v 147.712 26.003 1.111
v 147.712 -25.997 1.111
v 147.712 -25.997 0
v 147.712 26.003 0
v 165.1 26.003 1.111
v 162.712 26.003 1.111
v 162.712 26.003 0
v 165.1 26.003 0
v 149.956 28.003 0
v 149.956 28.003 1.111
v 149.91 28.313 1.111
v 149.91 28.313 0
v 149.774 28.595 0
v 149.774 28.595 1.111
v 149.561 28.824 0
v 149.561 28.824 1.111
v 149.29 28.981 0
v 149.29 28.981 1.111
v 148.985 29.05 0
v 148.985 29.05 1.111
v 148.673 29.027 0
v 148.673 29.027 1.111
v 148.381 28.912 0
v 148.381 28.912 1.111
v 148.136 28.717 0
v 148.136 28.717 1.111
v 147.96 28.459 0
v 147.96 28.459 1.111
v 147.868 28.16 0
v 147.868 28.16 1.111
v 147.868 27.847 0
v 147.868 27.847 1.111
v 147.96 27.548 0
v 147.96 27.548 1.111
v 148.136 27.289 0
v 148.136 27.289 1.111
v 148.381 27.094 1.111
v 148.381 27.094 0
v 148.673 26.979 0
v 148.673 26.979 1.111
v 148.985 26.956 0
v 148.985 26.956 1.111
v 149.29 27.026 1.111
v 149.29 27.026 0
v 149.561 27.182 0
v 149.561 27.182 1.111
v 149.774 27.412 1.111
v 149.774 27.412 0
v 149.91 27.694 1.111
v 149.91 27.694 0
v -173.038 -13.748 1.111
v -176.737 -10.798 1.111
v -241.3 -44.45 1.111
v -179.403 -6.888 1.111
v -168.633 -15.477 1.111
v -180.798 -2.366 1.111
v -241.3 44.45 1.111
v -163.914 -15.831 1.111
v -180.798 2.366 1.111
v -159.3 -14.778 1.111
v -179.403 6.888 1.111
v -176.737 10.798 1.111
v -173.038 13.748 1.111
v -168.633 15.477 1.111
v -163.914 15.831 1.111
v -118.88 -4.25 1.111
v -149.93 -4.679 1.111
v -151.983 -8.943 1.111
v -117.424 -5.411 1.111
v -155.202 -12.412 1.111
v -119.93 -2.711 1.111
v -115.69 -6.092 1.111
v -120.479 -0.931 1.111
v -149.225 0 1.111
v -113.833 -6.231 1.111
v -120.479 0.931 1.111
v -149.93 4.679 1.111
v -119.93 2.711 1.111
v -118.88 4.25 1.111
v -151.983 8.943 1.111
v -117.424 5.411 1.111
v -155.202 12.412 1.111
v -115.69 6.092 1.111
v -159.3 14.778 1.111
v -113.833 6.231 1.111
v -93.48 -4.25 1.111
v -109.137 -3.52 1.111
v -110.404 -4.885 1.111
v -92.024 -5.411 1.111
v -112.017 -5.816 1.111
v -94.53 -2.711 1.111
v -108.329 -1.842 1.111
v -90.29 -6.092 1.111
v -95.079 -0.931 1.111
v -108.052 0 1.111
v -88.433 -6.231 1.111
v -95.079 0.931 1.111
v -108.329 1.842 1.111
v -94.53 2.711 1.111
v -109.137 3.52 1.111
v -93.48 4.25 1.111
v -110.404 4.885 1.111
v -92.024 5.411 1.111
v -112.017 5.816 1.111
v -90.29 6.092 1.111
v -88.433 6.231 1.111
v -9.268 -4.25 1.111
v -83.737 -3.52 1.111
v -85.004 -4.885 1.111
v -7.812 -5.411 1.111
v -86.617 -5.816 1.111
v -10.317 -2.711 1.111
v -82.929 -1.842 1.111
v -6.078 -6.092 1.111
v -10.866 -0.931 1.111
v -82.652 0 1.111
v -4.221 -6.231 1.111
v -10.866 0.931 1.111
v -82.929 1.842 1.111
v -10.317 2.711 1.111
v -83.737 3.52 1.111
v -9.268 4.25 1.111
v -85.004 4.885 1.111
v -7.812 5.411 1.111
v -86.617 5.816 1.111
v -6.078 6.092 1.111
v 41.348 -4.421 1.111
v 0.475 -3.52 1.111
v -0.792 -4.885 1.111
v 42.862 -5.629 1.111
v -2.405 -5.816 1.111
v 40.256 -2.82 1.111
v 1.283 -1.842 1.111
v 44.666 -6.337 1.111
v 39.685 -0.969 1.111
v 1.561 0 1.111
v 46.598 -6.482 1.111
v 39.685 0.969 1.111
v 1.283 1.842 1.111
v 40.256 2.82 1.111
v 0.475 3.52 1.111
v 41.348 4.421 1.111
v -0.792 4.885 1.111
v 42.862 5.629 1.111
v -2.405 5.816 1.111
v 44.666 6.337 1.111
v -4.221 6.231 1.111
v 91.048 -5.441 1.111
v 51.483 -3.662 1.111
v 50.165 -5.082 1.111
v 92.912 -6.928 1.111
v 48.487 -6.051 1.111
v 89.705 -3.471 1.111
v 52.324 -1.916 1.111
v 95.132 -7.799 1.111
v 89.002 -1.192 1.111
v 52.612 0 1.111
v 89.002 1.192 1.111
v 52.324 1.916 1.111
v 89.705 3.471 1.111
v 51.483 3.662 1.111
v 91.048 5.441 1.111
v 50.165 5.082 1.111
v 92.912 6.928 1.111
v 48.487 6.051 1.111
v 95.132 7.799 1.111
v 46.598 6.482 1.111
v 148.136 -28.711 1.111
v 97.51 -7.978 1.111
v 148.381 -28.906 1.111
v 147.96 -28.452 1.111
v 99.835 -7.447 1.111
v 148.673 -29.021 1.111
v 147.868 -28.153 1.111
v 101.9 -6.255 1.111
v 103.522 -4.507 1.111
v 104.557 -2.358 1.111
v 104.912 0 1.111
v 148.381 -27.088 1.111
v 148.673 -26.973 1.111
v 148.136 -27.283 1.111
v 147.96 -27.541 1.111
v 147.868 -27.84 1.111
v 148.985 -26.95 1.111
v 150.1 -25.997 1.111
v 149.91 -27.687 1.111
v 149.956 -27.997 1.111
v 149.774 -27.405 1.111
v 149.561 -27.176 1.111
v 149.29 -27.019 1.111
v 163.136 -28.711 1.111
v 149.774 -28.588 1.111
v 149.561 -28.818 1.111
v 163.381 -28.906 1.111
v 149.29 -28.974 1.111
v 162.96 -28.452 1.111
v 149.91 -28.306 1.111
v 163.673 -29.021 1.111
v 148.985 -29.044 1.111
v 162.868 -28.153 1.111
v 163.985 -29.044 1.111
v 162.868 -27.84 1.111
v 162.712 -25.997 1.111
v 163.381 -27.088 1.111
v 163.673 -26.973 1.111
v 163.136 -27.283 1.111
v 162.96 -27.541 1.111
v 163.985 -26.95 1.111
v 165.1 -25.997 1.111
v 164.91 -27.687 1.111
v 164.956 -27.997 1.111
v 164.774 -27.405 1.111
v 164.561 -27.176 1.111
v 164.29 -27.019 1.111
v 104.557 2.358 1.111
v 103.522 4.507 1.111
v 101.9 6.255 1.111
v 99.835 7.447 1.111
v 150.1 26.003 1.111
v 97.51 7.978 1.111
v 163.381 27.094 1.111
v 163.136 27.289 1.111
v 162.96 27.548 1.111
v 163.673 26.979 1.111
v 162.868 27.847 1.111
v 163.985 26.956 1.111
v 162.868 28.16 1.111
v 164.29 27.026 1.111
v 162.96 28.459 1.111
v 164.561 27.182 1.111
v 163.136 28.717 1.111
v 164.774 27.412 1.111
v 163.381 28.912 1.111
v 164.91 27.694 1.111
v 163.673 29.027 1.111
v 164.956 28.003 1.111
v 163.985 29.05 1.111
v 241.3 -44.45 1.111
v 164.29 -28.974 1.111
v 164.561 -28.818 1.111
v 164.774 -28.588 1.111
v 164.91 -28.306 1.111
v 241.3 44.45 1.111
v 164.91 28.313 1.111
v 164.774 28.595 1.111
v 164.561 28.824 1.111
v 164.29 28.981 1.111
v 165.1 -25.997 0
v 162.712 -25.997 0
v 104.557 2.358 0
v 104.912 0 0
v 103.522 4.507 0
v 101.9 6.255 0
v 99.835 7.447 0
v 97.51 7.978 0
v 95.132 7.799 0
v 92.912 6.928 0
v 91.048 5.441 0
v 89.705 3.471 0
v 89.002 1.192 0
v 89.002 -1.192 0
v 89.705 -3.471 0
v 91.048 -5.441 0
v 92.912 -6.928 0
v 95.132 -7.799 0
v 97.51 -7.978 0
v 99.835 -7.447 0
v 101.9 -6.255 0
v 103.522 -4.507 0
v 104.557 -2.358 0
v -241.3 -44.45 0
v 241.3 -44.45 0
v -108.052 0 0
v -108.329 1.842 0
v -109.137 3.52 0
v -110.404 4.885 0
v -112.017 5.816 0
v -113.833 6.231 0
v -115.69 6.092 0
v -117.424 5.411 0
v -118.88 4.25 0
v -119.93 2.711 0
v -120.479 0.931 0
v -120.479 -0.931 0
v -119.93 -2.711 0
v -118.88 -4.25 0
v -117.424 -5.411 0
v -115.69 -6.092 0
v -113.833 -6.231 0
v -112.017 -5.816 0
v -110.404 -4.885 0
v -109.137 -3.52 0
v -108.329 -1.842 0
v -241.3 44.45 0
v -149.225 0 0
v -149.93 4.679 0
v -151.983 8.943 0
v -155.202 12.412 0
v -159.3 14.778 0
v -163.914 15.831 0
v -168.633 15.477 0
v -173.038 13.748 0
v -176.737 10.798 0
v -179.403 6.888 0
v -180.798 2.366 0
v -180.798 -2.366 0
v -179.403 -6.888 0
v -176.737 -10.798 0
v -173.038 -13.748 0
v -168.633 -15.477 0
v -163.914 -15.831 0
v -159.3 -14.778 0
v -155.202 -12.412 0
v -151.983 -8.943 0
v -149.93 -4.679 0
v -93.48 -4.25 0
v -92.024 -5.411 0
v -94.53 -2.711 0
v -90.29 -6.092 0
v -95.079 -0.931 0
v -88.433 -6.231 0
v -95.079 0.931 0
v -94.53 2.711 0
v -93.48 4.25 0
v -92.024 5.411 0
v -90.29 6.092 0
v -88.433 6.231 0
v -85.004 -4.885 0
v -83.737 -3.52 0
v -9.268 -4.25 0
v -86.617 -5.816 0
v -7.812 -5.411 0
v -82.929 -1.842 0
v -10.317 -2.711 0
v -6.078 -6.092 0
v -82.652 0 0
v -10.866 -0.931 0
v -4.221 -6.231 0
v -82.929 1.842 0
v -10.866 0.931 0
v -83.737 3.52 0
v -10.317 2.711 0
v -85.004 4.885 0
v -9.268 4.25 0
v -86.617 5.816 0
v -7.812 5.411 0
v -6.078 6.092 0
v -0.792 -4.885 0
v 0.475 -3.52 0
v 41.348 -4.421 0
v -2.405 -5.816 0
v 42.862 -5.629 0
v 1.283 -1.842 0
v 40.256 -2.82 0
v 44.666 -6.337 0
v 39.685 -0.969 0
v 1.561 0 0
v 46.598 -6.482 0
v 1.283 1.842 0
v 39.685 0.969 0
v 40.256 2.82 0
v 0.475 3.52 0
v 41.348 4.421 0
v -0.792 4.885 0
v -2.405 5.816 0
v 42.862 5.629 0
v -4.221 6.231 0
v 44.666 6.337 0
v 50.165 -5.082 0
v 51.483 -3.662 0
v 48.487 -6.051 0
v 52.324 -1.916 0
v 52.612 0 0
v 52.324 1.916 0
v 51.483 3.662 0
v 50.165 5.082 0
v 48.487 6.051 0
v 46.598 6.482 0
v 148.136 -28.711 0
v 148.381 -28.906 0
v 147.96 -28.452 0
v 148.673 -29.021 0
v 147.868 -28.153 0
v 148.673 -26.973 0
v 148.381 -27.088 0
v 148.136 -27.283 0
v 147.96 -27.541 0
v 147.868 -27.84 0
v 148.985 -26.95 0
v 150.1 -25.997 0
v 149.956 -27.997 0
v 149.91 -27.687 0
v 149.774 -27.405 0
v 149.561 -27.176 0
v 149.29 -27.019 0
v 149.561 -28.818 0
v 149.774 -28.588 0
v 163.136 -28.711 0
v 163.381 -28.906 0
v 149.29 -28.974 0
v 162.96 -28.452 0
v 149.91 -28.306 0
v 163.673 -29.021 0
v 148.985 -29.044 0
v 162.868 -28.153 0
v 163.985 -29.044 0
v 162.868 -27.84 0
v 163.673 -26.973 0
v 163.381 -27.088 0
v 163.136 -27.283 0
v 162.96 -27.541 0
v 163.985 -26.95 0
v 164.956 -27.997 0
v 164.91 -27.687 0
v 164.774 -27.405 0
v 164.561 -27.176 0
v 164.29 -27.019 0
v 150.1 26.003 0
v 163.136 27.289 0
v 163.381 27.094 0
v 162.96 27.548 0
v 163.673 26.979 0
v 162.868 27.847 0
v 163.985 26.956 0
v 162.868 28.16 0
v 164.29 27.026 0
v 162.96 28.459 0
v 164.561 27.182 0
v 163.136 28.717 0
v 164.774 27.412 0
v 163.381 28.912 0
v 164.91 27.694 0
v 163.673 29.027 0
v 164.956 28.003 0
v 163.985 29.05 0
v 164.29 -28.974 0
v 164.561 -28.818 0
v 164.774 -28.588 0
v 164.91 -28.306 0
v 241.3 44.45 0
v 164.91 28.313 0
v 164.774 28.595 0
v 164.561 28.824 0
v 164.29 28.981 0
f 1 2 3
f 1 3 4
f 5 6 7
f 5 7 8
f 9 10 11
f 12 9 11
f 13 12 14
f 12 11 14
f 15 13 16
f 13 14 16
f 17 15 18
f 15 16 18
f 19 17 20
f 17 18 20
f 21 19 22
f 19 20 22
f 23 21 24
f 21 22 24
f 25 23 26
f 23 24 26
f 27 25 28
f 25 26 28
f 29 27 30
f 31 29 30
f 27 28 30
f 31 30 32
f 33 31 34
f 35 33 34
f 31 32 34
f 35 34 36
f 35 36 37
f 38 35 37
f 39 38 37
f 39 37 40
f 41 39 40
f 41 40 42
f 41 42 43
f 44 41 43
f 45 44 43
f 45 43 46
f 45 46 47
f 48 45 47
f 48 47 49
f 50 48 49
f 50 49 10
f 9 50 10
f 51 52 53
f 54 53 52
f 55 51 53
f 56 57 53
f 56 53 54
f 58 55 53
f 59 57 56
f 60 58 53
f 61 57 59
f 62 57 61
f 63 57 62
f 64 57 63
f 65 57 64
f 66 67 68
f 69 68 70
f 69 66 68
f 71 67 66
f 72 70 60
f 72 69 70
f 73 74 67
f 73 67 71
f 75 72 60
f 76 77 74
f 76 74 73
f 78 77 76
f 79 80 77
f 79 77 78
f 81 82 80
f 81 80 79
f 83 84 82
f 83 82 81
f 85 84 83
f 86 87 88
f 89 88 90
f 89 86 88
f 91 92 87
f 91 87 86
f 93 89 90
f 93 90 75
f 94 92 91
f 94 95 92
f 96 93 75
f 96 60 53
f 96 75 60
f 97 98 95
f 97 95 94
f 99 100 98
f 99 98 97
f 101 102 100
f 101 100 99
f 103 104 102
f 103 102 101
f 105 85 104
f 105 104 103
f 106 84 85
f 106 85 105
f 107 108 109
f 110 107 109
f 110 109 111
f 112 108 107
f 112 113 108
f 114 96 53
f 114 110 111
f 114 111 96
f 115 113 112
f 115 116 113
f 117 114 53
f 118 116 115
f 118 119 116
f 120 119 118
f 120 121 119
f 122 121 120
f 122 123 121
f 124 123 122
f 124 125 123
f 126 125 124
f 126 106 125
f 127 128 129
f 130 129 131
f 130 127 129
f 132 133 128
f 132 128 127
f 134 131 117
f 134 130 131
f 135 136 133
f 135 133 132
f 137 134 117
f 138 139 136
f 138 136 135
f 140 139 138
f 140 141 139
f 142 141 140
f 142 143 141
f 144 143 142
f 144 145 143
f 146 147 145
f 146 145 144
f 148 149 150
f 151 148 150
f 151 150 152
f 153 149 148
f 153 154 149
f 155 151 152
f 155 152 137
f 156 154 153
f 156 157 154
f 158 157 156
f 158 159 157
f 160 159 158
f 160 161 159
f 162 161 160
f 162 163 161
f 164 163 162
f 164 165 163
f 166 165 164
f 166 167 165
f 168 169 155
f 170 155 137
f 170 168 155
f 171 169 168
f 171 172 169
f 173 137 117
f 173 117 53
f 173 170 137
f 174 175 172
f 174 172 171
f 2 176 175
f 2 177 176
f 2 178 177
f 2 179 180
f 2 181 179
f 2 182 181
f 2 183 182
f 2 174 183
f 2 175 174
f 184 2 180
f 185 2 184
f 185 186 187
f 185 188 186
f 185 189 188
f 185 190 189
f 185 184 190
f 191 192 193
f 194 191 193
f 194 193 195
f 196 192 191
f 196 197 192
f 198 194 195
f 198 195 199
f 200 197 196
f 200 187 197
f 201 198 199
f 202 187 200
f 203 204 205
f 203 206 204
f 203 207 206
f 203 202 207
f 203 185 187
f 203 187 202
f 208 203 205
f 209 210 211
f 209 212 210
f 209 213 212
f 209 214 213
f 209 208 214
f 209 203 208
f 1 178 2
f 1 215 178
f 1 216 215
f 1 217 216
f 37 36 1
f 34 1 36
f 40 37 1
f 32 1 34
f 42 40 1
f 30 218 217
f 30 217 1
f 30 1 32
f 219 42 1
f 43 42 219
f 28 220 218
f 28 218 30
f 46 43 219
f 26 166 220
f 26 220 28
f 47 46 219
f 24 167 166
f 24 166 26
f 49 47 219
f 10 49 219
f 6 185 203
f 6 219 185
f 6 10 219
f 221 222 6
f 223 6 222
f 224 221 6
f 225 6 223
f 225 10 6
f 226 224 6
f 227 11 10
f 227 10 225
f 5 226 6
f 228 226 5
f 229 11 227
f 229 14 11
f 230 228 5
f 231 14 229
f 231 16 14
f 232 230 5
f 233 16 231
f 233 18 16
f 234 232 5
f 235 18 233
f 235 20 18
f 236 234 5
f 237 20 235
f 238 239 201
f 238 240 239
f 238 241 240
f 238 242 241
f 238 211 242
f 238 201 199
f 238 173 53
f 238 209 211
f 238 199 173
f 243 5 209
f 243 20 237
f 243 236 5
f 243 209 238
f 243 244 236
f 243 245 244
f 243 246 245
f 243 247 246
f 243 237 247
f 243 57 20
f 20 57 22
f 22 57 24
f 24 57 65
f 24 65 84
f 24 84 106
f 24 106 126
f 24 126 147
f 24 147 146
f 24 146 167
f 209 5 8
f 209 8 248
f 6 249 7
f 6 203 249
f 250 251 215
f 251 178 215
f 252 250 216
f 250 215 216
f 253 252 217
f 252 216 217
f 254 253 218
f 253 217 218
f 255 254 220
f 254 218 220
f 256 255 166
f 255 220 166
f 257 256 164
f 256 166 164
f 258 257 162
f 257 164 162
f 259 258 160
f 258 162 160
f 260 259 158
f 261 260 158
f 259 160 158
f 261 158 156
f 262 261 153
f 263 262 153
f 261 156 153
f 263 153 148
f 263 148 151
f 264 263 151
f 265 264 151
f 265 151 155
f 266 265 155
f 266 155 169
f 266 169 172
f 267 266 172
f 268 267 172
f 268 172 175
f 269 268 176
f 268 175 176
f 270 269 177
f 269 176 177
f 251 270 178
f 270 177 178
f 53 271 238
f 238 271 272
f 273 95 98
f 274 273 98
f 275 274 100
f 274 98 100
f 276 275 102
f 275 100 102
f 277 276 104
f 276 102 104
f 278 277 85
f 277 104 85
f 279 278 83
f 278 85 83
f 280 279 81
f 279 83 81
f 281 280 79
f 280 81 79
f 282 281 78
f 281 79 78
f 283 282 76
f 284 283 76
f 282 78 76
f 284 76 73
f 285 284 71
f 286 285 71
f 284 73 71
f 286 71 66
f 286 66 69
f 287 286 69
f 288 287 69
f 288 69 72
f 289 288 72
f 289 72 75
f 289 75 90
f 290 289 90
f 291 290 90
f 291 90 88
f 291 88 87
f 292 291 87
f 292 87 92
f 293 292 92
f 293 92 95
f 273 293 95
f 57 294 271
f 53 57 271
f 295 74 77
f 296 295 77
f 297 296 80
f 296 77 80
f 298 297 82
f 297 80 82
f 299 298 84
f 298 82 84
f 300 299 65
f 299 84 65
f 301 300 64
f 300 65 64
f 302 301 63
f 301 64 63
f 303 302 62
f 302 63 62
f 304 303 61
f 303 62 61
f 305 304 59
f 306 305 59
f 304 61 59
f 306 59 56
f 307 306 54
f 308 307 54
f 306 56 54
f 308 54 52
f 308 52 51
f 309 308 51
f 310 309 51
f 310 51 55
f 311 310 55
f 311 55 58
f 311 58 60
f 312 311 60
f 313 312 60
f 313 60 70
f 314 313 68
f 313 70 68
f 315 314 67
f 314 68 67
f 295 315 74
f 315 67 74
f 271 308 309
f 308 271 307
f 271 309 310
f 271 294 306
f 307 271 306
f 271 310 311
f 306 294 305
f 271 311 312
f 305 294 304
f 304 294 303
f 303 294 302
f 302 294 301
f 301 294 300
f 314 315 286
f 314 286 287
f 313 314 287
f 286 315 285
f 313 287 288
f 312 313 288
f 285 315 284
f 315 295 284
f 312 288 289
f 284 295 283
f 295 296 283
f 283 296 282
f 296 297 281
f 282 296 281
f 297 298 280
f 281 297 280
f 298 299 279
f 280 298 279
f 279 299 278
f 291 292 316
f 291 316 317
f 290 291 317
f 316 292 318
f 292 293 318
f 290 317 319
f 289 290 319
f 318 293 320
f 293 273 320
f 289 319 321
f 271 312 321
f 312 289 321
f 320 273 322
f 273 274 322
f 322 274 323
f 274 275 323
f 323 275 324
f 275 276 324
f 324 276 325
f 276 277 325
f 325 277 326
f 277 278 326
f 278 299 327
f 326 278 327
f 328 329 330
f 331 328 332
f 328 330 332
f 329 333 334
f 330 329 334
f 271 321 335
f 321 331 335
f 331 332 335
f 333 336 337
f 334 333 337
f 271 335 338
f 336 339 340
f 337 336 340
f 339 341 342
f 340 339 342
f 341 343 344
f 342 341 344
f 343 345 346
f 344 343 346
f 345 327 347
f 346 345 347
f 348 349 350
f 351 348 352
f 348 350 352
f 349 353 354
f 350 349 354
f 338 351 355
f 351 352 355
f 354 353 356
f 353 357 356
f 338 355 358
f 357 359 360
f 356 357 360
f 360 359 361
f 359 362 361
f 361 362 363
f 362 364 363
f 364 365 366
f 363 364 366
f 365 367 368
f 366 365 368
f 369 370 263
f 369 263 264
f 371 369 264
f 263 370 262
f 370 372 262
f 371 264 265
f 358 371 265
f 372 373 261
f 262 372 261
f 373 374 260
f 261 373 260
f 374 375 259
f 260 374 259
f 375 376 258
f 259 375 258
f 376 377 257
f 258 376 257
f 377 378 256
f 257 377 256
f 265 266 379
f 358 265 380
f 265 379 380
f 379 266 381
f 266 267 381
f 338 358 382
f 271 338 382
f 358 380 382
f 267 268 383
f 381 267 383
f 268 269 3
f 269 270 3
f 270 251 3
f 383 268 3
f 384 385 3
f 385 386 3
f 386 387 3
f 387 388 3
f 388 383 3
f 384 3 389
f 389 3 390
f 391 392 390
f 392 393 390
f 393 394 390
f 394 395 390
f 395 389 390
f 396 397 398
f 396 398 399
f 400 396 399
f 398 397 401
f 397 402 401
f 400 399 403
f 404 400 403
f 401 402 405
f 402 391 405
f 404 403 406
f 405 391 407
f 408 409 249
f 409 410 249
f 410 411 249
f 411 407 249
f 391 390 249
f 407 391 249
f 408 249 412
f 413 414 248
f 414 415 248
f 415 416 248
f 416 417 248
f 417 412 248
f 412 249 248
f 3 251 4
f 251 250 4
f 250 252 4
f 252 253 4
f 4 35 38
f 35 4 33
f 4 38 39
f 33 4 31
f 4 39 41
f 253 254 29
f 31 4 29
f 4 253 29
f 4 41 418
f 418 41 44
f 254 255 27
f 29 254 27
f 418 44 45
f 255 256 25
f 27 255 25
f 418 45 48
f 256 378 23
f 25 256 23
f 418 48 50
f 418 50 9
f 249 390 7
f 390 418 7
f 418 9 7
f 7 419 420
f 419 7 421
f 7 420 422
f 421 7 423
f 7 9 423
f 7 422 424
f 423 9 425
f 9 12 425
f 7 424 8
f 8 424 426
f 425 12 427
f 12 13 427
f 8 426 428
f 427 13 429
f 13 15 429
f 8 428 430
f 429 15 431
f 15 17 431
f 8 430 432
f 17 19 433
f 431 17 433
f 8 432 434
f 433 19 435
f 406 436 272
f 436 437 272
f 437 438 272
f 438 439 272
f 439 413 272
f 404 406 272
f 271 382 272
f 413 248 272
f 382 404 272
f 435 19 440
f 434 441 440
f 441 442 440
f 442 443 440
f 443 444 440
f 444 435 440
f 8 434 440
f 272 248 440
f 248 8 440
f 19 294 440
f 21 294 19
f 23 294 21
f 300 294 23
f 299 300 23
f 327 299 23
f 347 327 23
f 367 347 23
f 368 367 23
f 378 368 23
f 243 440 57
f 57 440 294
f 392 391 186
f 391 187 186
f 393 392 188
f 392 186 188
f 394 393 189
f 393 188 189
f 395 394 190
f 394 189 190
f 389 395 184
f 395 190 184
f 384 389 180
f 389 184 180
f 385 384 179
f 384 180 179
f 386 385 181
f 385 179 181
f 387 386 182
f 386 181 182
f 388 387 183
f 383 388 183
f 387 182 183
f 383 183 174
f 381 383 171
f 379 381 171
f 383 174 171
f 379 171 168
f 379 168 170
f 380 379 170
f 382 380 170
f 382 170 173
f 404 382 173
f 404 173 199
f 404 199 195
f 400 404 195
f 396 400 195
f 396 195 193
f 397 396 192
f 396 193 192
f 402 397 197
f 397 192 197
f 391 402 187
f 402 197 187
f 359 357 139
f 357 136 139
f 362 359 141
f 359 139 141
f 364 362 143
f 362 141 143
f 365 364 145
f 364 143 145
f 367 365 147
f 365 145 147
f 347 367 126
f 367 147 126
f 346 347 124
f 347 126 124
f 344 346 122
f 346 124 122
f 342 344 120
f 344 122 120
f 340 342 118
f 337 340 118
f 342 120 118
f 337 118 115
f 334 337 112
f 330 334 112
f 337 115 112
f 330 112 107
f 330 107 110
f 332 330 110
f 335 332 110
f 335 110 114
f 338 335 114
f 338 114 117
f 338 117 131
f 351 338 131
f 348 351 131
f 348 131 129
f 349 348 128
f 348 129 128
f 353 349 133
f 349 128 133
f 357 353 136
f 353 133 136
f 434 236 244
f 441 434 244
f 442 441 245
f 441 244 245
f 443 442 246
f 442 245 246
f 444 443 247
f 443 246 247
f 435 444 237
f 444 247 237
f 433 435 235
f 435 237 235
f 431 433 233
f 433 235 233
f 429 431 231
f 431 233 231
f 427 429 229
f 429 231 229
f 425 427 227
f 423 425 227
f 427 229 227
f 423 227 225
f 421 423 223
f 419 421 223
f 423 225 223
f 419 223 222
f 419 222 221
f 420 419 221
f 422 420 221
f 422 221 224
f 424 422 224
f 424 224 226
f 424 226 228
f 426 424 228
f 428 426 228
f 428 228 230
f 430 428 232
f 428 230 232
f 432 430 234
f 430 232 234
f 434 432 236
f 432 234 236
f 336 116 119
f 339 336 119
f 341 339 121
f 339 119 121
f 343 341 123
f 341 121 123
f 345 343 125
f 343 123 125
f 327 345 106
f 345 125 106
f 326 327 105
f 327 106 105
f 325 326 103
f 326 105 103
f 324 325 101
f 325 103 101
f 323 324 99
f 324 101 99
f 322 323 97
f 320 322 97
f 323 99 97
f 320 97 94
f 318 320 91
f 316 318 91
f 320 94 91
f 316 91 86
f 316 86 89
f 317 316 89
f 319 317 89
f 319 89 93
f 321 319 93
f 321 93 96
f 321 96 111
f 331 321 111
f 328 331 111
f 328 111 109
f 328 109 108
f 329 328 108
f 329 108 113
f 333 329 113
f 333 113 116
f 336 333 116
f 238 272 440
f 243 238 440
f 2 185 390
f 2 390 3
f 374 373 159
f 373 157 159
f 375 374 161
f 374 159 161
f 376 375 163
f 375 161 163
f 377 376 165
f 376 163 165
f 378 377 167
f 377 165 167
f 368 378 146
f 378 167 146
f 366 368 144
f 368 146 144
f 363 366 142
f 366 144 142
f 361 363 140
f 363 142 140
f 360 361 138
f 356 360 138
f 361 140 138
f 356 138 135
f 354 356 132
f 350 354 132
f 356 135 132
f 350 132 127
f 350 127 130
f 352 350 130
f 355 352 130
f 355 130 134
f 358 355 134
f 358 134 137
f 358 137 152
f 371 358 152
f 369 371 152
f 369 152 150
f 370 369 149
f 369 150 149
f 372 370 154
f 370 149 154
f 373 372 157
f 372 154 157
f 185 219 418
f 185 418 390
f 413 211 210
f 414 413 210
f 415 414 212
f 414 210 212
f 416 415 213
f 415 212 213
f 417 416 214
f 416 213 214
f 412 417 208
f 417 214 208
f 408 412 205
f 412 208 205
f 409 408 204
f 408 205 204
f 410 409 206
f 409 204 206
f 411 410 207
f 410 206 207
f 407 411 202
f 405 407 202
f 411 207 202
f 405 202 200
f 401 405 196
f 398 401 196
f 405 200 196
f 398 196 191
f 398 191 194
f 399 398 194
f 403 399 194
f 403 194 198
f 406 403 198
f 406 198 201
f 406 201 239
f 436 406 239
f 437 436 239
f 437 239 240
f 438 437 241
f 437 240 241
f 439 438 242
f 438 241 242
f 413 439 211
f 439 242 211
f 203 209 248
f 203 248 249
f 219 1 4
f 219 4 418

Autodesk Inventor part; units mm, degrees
ref_plane "YZ Plane" through (0, 0, 0) normal (1, 0, 0) x (0, 1, 0)
ref_plane "XZ Plane" through (0, 0, 0) normal (0, 1, 0) x (-1, 0, 0)
ref_plane "XY Plane" through (0, 0, 0) normal (0, 0, 1) x (1, 0, 0)
sketch "Sketch1" plane through (0, 0, 0) normal (0, 0, 1) x (1, 0, 0)
  line L0 (-241.3, -44.45) -> (241.3, -44.45)
  line L1 (241.3, -44.45) -> (241.3, 44.45)
  line L2 (241.3, 44.45) -> (-241.3, 44.45)
  line L3 (-241.3, 44.45) -> (-241.3, -44.45)
  point P0 (0, 0)
  dimension "d0" = 482.6
  dimension "d1" = 88.9
  dimension "d62" = 44.45
  dimension "d63" = 241.3
extrude "Extrusion1" add sketch "Sketch1" along normal blind 1.1113
sketch "Sketch3" plane through (0, 0, 1.1113) normal (0, 0, 1) x (1, 0, 0)
  point P0 (0, 0)
sketch "Sketch4" plane through (0, 0, 1.1113) normal (0, 0, 1) x (1, 0, 0)
  line L0 (147.7124, 26.0031) -> (150.1, 26.0031)
  line L1 (150.1, 26.0031) -> (150.1, -25.9969)
  line L2 (150.1, -25.9969) -> (147.7124, -25.9969)
  line L3 (147.7124, -25.9969) -> (147.7124, 26.0031)
  line L4 (162.7124, 26.0031) -> (165.1, 26.0031)
  line L5 (165.1, 26.0031) -> (165.1, -25.9969)
  line L6 (165.1, -25.9969) -> (162.7124, -25.9969)
  line L7 (162.7124, -25.9969) -> (162.7124, 26.0031)
  line L8 (-241.3, -44.45) -> (241.3, -44.45) projected
  line L9 (241.3, -44.45) -> (241.3, 44.45) projected
  circle A0 centre (-114.3, 0) radius 6.2484
  circle A1 centre (-88.9, 0) radius 6.2484
  circle A2 centre (-4.6876, 0) radius 6.2484
  circle A3 centre (46.1124, 0) radius 6.5
  circle A4 centre (96.9124, 0) radius 8
  line L10 (241.3, 44.45) -> (-241.3, 44.45) projected
  line L11 (-241.3, -44.45) -> (241.3, -44.45) projected
  line L12 (241.3, -44.45) -> (241.3, 44.45) projected
  line L13 (241.3, 44.45) -> (-241.3, 44.45) projected
  line L14 (-241.3, 44.45) -> (-241.3, -44.45) projected
  circle A5 centre (163.9062, 28.0031) radius 1.05
  circle A6 centre (163.9062, -27.9969) radius 1.05
  circle A7 centre (148.9062, 28.0031) radius 1.05
  circle A8 centre (148.9062, -27.9969) radius 1.05
  circle A9 centre (-165.1, 0) radius 15.875
  line L15 (148.9062, 26.0031) -> (148.9062, -25.9969)
  line L16 (163.9062, 26.0031) -> (163.9062, -25.9969)
  point P0 (0, 0)
  dimension "d9" = 2.3876
  dimension "d12" = 2.3876
  dimension "d13" = 52
  dimension "d17" = 18.4531
  dimension "d18" = 52
  dimension "d20" = 18.4531
  dimension "d22" = 12.4968
  dimension "d23" = 12.4968
  dimension "d24" = 12.4968
  dimension "d26" = 13
  dimension "d27" = 16
  dimension "d28" = 50.8
  dimension "d35" = 44.45
  dimension "d36" = 44.45
  dimension "d38" = 44.45
  dimension "d40" = 44.45
  dimension "d42" = 50.8
  dimension "d47" = 2.1
  dimension "d48" = 2.1
  dimension "d49" = 56
  dimension "d50" = 2
  dimension "d53" = 2.1
  dimension "d54" = 2.1
  dimension "d55" = 56
  dimension "d58" = 2
  dimension "d59" = 76.2
  dimension "d65" = 31.75
  dimension "d66" = 25.4
  dimension "d67" = 44.45
  dimension "d68" = 50.8
  dimension "d69" = 76.2
  dimension "d70" = 44.45
  dimension "d71" = 50.8
  dimension "d74" = 15
  dimension "d75" = 0
  dimension "d76" = 0
  dimension "d77" = 0
  dimension "d78" = 0
extrude "Extrusion3" cut sketch "Sketch4" against normal up to next contours L0 L15 L2 L3 | L0 L1 L2 L15 | L4 L16 L6 L7 | L4 L5 L6 L16 | A0 | A1 | A2 | A3 | A4 | A5 | A6 | A7 | A8 | A9
properties part number "Faceplate"
